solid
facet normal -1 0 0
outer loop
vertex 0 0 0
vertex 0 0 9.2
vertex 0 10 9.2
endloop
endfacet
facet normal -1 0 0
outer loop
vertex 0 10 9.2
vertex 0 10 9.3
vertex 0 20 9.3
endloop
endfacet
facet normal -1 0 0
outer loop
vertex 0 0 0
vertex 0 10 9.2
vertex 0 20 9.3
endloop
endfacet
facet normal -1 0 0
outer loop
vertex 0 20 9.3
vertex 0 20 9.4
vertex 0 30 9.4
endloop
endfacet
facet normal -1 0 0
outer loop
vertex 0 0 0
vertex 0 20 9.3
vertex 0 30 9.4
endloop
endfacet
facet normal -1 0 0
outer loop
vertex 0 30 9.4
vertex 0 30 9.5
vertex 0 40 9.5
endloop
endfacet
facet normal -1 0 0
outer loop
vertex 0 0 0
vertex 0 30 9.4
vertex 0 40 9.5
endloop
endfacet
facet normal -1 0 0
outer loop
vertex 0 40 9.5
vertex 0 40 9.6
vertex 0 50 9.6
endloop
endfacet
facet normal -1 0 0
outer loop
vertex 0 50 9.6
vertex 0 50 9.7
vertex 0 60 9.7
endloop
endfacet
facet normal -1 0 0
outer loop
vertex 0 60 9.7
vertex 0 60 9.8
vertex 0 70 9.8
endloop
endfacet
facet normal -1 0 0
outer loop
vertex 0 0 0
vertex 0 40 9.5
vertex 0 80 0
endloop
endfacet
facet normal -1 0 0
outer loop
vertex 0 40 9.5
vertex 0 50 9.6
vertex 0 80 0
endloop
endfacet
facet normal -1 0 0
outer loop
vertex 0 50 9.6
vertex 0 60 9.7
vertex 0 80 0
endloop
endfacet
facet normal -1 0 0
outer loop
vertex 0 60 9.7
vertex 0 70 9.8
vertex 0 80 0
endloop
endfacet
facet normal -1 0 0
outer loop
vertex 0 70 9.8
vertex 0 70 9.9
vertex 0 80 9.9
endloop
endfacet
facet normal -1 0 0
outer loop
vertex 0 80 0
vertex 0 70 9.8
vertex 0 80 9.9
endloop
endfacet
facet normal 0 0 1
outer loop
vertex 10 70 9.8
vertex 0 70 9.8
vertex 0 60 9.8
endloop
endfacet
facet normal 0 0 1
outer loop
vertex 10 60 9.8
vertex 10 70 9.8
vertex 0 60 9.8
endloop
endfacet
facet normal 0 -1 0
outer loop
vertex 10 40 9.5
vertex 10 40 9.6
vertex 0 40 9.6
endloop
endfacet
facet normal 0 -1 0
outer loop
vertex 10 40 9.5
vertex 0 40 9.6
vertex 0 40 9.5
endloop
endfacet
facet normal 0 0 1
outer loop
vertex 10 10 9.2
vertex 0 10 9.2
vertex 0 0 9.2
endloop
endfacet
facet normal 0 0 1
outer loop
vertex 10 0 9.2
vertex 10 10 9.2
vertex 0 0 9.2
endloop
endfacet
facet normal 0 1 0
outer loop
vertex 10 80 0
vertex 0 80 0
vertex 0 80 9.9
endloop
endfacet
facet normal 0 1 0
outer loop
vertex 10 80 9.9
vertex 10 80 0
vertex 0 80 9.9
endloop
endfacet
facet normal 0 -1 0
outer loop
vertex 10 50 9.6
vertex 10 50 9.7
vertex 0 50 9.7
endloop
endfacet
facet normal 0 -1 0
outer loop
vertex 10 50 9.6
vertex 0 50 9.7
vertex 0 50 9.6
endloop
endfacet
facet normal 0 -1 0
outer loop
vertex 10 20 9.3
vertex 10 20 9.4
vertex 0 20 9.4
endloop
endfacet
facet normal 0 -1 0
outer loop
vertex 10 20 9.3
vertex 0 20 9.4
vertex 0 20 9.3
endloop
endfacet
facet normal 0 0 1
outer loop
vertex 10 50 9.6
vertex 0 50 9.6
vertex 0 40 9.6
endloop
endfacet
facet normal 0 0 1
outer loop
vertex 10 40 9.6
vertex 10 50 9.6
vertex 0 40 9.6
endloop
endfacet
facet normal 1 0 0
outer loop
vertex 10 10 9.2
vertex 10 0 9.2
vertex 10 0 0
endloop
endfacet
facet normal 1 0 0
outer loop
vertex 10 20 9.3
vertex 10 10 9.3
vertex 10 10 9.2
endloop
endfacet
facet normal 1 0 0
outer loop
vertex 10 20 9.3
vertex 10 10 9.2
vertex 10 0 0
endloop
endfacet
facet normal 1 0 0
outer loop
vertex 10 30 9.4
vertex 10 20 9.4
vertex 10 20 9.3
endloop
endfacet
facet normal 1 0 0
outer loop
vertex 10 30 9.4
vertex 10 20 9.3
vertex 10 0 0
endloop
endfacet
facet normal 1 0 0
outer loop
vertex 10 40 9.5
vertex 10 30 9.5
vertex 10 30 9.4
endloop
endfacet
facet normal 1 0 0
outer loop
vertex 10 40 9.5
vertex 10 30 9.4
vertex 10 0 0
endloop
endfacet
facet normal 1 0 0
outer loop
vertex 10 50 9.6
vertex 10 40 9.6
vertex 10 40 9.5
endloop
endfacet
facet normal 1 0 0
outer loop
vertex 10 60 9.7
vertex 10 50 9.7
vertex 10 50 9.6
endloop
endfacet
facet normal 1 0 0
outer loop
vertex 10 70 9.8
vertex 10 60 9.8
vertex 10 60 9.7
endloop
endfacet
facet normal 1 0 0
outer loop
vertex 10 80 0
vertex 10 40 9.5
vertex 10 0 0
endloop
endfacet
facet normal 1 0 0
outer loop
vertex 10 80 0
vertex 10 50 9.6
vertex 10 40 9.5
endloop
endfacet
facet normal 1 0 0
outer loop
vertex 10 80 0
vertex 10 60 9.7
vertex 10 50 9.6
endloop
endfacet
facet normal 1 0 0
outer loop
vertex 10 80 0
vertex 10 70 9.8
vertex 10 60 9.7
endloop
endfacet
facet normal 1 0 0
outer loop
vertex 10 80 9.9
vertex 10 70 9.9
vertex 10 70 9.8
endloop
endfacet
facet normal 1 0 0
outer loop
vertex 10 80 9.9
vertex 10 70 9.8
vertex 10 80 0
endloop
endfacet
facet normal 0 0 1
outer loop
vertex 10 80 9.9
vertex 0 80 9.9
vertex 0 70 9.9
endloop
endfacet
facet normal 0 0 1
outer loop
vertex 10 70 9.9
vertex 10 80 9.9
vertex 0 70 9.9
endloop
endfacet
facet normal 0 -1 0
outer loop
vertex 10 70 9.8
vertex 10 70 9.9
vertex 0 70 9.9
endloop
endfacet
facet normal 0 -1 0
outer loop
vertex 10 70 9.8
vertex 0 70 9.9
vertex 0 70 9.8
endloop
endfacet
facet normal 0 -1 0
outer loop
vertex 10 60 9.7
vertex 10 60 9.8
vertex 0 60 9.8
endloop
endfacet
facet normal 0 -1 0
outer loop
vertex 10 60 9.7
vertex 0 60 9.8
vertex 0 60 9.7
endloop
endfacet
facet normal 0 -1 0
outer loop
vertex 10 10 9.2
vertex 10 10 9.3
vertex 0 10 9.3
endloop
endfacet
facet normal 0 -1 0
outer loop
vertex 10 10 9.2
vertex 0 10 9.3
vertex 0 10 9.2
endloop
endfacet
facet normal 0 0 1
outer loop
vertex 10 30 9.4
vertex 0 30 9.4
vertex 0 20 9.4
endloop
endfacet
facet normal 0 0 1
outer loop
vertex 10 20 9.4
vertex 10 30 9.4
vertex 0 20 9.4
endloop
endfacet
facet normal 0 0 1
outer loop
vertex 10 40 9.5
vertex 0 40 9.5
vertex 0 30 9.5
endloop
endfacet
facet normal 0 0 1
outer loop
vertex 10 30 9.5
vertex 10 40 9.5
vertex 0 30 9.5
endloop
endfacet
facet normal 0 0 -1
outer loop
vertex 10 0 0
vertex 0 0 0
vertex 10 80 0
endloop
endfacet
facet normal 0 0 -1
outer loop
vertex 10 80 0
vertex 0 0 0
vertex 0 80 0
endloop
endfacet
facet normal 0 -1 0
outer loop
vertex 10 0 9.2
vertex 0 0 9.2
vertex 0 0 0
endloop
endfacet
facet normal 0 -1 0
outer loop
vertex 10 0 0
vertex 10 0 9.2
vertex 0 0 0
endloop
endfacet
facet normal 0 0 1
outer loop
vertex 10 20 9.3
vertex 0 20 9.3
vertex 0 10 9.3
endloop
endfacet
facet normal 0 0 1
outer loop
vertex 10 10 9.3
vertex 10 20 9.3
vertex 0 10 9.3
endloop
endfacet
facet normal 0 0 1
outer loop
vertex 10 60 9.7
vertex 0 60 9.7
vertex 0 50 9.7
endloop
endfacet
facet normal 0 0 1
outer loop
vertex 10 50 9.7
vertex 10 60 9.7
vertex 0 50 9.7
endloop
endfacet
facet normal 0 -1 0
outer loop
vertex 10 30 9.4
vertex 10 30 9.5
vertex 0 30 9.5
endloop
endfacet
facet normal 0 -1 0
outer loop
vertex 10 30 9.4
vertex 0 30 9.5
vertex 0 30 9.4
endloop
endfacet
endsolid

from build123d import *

# Parameters (mm, degrees)
F1_DEPTH = 10


with BuildPart() as f1:
    # F0 (on Right) → F1 (new body)
    with BuildSketch(Plane.YZ):
        Polygon((0, 9.2), (0, 0), (80, 0), (80, 9.9), (70, 9.9), (70, 9.8), (60, 9.8), (60, 9.7), (50, 9.7), (50, 9.6), (40, 9.6), (40, 9.5), (30, 9.5), (30, 9.4), (20, 9.4), (20, 9.3), (10, 9.3), (10, 9.2), align=None)
    extrude(amount=F1_DEPTH)


solid = f1.part
